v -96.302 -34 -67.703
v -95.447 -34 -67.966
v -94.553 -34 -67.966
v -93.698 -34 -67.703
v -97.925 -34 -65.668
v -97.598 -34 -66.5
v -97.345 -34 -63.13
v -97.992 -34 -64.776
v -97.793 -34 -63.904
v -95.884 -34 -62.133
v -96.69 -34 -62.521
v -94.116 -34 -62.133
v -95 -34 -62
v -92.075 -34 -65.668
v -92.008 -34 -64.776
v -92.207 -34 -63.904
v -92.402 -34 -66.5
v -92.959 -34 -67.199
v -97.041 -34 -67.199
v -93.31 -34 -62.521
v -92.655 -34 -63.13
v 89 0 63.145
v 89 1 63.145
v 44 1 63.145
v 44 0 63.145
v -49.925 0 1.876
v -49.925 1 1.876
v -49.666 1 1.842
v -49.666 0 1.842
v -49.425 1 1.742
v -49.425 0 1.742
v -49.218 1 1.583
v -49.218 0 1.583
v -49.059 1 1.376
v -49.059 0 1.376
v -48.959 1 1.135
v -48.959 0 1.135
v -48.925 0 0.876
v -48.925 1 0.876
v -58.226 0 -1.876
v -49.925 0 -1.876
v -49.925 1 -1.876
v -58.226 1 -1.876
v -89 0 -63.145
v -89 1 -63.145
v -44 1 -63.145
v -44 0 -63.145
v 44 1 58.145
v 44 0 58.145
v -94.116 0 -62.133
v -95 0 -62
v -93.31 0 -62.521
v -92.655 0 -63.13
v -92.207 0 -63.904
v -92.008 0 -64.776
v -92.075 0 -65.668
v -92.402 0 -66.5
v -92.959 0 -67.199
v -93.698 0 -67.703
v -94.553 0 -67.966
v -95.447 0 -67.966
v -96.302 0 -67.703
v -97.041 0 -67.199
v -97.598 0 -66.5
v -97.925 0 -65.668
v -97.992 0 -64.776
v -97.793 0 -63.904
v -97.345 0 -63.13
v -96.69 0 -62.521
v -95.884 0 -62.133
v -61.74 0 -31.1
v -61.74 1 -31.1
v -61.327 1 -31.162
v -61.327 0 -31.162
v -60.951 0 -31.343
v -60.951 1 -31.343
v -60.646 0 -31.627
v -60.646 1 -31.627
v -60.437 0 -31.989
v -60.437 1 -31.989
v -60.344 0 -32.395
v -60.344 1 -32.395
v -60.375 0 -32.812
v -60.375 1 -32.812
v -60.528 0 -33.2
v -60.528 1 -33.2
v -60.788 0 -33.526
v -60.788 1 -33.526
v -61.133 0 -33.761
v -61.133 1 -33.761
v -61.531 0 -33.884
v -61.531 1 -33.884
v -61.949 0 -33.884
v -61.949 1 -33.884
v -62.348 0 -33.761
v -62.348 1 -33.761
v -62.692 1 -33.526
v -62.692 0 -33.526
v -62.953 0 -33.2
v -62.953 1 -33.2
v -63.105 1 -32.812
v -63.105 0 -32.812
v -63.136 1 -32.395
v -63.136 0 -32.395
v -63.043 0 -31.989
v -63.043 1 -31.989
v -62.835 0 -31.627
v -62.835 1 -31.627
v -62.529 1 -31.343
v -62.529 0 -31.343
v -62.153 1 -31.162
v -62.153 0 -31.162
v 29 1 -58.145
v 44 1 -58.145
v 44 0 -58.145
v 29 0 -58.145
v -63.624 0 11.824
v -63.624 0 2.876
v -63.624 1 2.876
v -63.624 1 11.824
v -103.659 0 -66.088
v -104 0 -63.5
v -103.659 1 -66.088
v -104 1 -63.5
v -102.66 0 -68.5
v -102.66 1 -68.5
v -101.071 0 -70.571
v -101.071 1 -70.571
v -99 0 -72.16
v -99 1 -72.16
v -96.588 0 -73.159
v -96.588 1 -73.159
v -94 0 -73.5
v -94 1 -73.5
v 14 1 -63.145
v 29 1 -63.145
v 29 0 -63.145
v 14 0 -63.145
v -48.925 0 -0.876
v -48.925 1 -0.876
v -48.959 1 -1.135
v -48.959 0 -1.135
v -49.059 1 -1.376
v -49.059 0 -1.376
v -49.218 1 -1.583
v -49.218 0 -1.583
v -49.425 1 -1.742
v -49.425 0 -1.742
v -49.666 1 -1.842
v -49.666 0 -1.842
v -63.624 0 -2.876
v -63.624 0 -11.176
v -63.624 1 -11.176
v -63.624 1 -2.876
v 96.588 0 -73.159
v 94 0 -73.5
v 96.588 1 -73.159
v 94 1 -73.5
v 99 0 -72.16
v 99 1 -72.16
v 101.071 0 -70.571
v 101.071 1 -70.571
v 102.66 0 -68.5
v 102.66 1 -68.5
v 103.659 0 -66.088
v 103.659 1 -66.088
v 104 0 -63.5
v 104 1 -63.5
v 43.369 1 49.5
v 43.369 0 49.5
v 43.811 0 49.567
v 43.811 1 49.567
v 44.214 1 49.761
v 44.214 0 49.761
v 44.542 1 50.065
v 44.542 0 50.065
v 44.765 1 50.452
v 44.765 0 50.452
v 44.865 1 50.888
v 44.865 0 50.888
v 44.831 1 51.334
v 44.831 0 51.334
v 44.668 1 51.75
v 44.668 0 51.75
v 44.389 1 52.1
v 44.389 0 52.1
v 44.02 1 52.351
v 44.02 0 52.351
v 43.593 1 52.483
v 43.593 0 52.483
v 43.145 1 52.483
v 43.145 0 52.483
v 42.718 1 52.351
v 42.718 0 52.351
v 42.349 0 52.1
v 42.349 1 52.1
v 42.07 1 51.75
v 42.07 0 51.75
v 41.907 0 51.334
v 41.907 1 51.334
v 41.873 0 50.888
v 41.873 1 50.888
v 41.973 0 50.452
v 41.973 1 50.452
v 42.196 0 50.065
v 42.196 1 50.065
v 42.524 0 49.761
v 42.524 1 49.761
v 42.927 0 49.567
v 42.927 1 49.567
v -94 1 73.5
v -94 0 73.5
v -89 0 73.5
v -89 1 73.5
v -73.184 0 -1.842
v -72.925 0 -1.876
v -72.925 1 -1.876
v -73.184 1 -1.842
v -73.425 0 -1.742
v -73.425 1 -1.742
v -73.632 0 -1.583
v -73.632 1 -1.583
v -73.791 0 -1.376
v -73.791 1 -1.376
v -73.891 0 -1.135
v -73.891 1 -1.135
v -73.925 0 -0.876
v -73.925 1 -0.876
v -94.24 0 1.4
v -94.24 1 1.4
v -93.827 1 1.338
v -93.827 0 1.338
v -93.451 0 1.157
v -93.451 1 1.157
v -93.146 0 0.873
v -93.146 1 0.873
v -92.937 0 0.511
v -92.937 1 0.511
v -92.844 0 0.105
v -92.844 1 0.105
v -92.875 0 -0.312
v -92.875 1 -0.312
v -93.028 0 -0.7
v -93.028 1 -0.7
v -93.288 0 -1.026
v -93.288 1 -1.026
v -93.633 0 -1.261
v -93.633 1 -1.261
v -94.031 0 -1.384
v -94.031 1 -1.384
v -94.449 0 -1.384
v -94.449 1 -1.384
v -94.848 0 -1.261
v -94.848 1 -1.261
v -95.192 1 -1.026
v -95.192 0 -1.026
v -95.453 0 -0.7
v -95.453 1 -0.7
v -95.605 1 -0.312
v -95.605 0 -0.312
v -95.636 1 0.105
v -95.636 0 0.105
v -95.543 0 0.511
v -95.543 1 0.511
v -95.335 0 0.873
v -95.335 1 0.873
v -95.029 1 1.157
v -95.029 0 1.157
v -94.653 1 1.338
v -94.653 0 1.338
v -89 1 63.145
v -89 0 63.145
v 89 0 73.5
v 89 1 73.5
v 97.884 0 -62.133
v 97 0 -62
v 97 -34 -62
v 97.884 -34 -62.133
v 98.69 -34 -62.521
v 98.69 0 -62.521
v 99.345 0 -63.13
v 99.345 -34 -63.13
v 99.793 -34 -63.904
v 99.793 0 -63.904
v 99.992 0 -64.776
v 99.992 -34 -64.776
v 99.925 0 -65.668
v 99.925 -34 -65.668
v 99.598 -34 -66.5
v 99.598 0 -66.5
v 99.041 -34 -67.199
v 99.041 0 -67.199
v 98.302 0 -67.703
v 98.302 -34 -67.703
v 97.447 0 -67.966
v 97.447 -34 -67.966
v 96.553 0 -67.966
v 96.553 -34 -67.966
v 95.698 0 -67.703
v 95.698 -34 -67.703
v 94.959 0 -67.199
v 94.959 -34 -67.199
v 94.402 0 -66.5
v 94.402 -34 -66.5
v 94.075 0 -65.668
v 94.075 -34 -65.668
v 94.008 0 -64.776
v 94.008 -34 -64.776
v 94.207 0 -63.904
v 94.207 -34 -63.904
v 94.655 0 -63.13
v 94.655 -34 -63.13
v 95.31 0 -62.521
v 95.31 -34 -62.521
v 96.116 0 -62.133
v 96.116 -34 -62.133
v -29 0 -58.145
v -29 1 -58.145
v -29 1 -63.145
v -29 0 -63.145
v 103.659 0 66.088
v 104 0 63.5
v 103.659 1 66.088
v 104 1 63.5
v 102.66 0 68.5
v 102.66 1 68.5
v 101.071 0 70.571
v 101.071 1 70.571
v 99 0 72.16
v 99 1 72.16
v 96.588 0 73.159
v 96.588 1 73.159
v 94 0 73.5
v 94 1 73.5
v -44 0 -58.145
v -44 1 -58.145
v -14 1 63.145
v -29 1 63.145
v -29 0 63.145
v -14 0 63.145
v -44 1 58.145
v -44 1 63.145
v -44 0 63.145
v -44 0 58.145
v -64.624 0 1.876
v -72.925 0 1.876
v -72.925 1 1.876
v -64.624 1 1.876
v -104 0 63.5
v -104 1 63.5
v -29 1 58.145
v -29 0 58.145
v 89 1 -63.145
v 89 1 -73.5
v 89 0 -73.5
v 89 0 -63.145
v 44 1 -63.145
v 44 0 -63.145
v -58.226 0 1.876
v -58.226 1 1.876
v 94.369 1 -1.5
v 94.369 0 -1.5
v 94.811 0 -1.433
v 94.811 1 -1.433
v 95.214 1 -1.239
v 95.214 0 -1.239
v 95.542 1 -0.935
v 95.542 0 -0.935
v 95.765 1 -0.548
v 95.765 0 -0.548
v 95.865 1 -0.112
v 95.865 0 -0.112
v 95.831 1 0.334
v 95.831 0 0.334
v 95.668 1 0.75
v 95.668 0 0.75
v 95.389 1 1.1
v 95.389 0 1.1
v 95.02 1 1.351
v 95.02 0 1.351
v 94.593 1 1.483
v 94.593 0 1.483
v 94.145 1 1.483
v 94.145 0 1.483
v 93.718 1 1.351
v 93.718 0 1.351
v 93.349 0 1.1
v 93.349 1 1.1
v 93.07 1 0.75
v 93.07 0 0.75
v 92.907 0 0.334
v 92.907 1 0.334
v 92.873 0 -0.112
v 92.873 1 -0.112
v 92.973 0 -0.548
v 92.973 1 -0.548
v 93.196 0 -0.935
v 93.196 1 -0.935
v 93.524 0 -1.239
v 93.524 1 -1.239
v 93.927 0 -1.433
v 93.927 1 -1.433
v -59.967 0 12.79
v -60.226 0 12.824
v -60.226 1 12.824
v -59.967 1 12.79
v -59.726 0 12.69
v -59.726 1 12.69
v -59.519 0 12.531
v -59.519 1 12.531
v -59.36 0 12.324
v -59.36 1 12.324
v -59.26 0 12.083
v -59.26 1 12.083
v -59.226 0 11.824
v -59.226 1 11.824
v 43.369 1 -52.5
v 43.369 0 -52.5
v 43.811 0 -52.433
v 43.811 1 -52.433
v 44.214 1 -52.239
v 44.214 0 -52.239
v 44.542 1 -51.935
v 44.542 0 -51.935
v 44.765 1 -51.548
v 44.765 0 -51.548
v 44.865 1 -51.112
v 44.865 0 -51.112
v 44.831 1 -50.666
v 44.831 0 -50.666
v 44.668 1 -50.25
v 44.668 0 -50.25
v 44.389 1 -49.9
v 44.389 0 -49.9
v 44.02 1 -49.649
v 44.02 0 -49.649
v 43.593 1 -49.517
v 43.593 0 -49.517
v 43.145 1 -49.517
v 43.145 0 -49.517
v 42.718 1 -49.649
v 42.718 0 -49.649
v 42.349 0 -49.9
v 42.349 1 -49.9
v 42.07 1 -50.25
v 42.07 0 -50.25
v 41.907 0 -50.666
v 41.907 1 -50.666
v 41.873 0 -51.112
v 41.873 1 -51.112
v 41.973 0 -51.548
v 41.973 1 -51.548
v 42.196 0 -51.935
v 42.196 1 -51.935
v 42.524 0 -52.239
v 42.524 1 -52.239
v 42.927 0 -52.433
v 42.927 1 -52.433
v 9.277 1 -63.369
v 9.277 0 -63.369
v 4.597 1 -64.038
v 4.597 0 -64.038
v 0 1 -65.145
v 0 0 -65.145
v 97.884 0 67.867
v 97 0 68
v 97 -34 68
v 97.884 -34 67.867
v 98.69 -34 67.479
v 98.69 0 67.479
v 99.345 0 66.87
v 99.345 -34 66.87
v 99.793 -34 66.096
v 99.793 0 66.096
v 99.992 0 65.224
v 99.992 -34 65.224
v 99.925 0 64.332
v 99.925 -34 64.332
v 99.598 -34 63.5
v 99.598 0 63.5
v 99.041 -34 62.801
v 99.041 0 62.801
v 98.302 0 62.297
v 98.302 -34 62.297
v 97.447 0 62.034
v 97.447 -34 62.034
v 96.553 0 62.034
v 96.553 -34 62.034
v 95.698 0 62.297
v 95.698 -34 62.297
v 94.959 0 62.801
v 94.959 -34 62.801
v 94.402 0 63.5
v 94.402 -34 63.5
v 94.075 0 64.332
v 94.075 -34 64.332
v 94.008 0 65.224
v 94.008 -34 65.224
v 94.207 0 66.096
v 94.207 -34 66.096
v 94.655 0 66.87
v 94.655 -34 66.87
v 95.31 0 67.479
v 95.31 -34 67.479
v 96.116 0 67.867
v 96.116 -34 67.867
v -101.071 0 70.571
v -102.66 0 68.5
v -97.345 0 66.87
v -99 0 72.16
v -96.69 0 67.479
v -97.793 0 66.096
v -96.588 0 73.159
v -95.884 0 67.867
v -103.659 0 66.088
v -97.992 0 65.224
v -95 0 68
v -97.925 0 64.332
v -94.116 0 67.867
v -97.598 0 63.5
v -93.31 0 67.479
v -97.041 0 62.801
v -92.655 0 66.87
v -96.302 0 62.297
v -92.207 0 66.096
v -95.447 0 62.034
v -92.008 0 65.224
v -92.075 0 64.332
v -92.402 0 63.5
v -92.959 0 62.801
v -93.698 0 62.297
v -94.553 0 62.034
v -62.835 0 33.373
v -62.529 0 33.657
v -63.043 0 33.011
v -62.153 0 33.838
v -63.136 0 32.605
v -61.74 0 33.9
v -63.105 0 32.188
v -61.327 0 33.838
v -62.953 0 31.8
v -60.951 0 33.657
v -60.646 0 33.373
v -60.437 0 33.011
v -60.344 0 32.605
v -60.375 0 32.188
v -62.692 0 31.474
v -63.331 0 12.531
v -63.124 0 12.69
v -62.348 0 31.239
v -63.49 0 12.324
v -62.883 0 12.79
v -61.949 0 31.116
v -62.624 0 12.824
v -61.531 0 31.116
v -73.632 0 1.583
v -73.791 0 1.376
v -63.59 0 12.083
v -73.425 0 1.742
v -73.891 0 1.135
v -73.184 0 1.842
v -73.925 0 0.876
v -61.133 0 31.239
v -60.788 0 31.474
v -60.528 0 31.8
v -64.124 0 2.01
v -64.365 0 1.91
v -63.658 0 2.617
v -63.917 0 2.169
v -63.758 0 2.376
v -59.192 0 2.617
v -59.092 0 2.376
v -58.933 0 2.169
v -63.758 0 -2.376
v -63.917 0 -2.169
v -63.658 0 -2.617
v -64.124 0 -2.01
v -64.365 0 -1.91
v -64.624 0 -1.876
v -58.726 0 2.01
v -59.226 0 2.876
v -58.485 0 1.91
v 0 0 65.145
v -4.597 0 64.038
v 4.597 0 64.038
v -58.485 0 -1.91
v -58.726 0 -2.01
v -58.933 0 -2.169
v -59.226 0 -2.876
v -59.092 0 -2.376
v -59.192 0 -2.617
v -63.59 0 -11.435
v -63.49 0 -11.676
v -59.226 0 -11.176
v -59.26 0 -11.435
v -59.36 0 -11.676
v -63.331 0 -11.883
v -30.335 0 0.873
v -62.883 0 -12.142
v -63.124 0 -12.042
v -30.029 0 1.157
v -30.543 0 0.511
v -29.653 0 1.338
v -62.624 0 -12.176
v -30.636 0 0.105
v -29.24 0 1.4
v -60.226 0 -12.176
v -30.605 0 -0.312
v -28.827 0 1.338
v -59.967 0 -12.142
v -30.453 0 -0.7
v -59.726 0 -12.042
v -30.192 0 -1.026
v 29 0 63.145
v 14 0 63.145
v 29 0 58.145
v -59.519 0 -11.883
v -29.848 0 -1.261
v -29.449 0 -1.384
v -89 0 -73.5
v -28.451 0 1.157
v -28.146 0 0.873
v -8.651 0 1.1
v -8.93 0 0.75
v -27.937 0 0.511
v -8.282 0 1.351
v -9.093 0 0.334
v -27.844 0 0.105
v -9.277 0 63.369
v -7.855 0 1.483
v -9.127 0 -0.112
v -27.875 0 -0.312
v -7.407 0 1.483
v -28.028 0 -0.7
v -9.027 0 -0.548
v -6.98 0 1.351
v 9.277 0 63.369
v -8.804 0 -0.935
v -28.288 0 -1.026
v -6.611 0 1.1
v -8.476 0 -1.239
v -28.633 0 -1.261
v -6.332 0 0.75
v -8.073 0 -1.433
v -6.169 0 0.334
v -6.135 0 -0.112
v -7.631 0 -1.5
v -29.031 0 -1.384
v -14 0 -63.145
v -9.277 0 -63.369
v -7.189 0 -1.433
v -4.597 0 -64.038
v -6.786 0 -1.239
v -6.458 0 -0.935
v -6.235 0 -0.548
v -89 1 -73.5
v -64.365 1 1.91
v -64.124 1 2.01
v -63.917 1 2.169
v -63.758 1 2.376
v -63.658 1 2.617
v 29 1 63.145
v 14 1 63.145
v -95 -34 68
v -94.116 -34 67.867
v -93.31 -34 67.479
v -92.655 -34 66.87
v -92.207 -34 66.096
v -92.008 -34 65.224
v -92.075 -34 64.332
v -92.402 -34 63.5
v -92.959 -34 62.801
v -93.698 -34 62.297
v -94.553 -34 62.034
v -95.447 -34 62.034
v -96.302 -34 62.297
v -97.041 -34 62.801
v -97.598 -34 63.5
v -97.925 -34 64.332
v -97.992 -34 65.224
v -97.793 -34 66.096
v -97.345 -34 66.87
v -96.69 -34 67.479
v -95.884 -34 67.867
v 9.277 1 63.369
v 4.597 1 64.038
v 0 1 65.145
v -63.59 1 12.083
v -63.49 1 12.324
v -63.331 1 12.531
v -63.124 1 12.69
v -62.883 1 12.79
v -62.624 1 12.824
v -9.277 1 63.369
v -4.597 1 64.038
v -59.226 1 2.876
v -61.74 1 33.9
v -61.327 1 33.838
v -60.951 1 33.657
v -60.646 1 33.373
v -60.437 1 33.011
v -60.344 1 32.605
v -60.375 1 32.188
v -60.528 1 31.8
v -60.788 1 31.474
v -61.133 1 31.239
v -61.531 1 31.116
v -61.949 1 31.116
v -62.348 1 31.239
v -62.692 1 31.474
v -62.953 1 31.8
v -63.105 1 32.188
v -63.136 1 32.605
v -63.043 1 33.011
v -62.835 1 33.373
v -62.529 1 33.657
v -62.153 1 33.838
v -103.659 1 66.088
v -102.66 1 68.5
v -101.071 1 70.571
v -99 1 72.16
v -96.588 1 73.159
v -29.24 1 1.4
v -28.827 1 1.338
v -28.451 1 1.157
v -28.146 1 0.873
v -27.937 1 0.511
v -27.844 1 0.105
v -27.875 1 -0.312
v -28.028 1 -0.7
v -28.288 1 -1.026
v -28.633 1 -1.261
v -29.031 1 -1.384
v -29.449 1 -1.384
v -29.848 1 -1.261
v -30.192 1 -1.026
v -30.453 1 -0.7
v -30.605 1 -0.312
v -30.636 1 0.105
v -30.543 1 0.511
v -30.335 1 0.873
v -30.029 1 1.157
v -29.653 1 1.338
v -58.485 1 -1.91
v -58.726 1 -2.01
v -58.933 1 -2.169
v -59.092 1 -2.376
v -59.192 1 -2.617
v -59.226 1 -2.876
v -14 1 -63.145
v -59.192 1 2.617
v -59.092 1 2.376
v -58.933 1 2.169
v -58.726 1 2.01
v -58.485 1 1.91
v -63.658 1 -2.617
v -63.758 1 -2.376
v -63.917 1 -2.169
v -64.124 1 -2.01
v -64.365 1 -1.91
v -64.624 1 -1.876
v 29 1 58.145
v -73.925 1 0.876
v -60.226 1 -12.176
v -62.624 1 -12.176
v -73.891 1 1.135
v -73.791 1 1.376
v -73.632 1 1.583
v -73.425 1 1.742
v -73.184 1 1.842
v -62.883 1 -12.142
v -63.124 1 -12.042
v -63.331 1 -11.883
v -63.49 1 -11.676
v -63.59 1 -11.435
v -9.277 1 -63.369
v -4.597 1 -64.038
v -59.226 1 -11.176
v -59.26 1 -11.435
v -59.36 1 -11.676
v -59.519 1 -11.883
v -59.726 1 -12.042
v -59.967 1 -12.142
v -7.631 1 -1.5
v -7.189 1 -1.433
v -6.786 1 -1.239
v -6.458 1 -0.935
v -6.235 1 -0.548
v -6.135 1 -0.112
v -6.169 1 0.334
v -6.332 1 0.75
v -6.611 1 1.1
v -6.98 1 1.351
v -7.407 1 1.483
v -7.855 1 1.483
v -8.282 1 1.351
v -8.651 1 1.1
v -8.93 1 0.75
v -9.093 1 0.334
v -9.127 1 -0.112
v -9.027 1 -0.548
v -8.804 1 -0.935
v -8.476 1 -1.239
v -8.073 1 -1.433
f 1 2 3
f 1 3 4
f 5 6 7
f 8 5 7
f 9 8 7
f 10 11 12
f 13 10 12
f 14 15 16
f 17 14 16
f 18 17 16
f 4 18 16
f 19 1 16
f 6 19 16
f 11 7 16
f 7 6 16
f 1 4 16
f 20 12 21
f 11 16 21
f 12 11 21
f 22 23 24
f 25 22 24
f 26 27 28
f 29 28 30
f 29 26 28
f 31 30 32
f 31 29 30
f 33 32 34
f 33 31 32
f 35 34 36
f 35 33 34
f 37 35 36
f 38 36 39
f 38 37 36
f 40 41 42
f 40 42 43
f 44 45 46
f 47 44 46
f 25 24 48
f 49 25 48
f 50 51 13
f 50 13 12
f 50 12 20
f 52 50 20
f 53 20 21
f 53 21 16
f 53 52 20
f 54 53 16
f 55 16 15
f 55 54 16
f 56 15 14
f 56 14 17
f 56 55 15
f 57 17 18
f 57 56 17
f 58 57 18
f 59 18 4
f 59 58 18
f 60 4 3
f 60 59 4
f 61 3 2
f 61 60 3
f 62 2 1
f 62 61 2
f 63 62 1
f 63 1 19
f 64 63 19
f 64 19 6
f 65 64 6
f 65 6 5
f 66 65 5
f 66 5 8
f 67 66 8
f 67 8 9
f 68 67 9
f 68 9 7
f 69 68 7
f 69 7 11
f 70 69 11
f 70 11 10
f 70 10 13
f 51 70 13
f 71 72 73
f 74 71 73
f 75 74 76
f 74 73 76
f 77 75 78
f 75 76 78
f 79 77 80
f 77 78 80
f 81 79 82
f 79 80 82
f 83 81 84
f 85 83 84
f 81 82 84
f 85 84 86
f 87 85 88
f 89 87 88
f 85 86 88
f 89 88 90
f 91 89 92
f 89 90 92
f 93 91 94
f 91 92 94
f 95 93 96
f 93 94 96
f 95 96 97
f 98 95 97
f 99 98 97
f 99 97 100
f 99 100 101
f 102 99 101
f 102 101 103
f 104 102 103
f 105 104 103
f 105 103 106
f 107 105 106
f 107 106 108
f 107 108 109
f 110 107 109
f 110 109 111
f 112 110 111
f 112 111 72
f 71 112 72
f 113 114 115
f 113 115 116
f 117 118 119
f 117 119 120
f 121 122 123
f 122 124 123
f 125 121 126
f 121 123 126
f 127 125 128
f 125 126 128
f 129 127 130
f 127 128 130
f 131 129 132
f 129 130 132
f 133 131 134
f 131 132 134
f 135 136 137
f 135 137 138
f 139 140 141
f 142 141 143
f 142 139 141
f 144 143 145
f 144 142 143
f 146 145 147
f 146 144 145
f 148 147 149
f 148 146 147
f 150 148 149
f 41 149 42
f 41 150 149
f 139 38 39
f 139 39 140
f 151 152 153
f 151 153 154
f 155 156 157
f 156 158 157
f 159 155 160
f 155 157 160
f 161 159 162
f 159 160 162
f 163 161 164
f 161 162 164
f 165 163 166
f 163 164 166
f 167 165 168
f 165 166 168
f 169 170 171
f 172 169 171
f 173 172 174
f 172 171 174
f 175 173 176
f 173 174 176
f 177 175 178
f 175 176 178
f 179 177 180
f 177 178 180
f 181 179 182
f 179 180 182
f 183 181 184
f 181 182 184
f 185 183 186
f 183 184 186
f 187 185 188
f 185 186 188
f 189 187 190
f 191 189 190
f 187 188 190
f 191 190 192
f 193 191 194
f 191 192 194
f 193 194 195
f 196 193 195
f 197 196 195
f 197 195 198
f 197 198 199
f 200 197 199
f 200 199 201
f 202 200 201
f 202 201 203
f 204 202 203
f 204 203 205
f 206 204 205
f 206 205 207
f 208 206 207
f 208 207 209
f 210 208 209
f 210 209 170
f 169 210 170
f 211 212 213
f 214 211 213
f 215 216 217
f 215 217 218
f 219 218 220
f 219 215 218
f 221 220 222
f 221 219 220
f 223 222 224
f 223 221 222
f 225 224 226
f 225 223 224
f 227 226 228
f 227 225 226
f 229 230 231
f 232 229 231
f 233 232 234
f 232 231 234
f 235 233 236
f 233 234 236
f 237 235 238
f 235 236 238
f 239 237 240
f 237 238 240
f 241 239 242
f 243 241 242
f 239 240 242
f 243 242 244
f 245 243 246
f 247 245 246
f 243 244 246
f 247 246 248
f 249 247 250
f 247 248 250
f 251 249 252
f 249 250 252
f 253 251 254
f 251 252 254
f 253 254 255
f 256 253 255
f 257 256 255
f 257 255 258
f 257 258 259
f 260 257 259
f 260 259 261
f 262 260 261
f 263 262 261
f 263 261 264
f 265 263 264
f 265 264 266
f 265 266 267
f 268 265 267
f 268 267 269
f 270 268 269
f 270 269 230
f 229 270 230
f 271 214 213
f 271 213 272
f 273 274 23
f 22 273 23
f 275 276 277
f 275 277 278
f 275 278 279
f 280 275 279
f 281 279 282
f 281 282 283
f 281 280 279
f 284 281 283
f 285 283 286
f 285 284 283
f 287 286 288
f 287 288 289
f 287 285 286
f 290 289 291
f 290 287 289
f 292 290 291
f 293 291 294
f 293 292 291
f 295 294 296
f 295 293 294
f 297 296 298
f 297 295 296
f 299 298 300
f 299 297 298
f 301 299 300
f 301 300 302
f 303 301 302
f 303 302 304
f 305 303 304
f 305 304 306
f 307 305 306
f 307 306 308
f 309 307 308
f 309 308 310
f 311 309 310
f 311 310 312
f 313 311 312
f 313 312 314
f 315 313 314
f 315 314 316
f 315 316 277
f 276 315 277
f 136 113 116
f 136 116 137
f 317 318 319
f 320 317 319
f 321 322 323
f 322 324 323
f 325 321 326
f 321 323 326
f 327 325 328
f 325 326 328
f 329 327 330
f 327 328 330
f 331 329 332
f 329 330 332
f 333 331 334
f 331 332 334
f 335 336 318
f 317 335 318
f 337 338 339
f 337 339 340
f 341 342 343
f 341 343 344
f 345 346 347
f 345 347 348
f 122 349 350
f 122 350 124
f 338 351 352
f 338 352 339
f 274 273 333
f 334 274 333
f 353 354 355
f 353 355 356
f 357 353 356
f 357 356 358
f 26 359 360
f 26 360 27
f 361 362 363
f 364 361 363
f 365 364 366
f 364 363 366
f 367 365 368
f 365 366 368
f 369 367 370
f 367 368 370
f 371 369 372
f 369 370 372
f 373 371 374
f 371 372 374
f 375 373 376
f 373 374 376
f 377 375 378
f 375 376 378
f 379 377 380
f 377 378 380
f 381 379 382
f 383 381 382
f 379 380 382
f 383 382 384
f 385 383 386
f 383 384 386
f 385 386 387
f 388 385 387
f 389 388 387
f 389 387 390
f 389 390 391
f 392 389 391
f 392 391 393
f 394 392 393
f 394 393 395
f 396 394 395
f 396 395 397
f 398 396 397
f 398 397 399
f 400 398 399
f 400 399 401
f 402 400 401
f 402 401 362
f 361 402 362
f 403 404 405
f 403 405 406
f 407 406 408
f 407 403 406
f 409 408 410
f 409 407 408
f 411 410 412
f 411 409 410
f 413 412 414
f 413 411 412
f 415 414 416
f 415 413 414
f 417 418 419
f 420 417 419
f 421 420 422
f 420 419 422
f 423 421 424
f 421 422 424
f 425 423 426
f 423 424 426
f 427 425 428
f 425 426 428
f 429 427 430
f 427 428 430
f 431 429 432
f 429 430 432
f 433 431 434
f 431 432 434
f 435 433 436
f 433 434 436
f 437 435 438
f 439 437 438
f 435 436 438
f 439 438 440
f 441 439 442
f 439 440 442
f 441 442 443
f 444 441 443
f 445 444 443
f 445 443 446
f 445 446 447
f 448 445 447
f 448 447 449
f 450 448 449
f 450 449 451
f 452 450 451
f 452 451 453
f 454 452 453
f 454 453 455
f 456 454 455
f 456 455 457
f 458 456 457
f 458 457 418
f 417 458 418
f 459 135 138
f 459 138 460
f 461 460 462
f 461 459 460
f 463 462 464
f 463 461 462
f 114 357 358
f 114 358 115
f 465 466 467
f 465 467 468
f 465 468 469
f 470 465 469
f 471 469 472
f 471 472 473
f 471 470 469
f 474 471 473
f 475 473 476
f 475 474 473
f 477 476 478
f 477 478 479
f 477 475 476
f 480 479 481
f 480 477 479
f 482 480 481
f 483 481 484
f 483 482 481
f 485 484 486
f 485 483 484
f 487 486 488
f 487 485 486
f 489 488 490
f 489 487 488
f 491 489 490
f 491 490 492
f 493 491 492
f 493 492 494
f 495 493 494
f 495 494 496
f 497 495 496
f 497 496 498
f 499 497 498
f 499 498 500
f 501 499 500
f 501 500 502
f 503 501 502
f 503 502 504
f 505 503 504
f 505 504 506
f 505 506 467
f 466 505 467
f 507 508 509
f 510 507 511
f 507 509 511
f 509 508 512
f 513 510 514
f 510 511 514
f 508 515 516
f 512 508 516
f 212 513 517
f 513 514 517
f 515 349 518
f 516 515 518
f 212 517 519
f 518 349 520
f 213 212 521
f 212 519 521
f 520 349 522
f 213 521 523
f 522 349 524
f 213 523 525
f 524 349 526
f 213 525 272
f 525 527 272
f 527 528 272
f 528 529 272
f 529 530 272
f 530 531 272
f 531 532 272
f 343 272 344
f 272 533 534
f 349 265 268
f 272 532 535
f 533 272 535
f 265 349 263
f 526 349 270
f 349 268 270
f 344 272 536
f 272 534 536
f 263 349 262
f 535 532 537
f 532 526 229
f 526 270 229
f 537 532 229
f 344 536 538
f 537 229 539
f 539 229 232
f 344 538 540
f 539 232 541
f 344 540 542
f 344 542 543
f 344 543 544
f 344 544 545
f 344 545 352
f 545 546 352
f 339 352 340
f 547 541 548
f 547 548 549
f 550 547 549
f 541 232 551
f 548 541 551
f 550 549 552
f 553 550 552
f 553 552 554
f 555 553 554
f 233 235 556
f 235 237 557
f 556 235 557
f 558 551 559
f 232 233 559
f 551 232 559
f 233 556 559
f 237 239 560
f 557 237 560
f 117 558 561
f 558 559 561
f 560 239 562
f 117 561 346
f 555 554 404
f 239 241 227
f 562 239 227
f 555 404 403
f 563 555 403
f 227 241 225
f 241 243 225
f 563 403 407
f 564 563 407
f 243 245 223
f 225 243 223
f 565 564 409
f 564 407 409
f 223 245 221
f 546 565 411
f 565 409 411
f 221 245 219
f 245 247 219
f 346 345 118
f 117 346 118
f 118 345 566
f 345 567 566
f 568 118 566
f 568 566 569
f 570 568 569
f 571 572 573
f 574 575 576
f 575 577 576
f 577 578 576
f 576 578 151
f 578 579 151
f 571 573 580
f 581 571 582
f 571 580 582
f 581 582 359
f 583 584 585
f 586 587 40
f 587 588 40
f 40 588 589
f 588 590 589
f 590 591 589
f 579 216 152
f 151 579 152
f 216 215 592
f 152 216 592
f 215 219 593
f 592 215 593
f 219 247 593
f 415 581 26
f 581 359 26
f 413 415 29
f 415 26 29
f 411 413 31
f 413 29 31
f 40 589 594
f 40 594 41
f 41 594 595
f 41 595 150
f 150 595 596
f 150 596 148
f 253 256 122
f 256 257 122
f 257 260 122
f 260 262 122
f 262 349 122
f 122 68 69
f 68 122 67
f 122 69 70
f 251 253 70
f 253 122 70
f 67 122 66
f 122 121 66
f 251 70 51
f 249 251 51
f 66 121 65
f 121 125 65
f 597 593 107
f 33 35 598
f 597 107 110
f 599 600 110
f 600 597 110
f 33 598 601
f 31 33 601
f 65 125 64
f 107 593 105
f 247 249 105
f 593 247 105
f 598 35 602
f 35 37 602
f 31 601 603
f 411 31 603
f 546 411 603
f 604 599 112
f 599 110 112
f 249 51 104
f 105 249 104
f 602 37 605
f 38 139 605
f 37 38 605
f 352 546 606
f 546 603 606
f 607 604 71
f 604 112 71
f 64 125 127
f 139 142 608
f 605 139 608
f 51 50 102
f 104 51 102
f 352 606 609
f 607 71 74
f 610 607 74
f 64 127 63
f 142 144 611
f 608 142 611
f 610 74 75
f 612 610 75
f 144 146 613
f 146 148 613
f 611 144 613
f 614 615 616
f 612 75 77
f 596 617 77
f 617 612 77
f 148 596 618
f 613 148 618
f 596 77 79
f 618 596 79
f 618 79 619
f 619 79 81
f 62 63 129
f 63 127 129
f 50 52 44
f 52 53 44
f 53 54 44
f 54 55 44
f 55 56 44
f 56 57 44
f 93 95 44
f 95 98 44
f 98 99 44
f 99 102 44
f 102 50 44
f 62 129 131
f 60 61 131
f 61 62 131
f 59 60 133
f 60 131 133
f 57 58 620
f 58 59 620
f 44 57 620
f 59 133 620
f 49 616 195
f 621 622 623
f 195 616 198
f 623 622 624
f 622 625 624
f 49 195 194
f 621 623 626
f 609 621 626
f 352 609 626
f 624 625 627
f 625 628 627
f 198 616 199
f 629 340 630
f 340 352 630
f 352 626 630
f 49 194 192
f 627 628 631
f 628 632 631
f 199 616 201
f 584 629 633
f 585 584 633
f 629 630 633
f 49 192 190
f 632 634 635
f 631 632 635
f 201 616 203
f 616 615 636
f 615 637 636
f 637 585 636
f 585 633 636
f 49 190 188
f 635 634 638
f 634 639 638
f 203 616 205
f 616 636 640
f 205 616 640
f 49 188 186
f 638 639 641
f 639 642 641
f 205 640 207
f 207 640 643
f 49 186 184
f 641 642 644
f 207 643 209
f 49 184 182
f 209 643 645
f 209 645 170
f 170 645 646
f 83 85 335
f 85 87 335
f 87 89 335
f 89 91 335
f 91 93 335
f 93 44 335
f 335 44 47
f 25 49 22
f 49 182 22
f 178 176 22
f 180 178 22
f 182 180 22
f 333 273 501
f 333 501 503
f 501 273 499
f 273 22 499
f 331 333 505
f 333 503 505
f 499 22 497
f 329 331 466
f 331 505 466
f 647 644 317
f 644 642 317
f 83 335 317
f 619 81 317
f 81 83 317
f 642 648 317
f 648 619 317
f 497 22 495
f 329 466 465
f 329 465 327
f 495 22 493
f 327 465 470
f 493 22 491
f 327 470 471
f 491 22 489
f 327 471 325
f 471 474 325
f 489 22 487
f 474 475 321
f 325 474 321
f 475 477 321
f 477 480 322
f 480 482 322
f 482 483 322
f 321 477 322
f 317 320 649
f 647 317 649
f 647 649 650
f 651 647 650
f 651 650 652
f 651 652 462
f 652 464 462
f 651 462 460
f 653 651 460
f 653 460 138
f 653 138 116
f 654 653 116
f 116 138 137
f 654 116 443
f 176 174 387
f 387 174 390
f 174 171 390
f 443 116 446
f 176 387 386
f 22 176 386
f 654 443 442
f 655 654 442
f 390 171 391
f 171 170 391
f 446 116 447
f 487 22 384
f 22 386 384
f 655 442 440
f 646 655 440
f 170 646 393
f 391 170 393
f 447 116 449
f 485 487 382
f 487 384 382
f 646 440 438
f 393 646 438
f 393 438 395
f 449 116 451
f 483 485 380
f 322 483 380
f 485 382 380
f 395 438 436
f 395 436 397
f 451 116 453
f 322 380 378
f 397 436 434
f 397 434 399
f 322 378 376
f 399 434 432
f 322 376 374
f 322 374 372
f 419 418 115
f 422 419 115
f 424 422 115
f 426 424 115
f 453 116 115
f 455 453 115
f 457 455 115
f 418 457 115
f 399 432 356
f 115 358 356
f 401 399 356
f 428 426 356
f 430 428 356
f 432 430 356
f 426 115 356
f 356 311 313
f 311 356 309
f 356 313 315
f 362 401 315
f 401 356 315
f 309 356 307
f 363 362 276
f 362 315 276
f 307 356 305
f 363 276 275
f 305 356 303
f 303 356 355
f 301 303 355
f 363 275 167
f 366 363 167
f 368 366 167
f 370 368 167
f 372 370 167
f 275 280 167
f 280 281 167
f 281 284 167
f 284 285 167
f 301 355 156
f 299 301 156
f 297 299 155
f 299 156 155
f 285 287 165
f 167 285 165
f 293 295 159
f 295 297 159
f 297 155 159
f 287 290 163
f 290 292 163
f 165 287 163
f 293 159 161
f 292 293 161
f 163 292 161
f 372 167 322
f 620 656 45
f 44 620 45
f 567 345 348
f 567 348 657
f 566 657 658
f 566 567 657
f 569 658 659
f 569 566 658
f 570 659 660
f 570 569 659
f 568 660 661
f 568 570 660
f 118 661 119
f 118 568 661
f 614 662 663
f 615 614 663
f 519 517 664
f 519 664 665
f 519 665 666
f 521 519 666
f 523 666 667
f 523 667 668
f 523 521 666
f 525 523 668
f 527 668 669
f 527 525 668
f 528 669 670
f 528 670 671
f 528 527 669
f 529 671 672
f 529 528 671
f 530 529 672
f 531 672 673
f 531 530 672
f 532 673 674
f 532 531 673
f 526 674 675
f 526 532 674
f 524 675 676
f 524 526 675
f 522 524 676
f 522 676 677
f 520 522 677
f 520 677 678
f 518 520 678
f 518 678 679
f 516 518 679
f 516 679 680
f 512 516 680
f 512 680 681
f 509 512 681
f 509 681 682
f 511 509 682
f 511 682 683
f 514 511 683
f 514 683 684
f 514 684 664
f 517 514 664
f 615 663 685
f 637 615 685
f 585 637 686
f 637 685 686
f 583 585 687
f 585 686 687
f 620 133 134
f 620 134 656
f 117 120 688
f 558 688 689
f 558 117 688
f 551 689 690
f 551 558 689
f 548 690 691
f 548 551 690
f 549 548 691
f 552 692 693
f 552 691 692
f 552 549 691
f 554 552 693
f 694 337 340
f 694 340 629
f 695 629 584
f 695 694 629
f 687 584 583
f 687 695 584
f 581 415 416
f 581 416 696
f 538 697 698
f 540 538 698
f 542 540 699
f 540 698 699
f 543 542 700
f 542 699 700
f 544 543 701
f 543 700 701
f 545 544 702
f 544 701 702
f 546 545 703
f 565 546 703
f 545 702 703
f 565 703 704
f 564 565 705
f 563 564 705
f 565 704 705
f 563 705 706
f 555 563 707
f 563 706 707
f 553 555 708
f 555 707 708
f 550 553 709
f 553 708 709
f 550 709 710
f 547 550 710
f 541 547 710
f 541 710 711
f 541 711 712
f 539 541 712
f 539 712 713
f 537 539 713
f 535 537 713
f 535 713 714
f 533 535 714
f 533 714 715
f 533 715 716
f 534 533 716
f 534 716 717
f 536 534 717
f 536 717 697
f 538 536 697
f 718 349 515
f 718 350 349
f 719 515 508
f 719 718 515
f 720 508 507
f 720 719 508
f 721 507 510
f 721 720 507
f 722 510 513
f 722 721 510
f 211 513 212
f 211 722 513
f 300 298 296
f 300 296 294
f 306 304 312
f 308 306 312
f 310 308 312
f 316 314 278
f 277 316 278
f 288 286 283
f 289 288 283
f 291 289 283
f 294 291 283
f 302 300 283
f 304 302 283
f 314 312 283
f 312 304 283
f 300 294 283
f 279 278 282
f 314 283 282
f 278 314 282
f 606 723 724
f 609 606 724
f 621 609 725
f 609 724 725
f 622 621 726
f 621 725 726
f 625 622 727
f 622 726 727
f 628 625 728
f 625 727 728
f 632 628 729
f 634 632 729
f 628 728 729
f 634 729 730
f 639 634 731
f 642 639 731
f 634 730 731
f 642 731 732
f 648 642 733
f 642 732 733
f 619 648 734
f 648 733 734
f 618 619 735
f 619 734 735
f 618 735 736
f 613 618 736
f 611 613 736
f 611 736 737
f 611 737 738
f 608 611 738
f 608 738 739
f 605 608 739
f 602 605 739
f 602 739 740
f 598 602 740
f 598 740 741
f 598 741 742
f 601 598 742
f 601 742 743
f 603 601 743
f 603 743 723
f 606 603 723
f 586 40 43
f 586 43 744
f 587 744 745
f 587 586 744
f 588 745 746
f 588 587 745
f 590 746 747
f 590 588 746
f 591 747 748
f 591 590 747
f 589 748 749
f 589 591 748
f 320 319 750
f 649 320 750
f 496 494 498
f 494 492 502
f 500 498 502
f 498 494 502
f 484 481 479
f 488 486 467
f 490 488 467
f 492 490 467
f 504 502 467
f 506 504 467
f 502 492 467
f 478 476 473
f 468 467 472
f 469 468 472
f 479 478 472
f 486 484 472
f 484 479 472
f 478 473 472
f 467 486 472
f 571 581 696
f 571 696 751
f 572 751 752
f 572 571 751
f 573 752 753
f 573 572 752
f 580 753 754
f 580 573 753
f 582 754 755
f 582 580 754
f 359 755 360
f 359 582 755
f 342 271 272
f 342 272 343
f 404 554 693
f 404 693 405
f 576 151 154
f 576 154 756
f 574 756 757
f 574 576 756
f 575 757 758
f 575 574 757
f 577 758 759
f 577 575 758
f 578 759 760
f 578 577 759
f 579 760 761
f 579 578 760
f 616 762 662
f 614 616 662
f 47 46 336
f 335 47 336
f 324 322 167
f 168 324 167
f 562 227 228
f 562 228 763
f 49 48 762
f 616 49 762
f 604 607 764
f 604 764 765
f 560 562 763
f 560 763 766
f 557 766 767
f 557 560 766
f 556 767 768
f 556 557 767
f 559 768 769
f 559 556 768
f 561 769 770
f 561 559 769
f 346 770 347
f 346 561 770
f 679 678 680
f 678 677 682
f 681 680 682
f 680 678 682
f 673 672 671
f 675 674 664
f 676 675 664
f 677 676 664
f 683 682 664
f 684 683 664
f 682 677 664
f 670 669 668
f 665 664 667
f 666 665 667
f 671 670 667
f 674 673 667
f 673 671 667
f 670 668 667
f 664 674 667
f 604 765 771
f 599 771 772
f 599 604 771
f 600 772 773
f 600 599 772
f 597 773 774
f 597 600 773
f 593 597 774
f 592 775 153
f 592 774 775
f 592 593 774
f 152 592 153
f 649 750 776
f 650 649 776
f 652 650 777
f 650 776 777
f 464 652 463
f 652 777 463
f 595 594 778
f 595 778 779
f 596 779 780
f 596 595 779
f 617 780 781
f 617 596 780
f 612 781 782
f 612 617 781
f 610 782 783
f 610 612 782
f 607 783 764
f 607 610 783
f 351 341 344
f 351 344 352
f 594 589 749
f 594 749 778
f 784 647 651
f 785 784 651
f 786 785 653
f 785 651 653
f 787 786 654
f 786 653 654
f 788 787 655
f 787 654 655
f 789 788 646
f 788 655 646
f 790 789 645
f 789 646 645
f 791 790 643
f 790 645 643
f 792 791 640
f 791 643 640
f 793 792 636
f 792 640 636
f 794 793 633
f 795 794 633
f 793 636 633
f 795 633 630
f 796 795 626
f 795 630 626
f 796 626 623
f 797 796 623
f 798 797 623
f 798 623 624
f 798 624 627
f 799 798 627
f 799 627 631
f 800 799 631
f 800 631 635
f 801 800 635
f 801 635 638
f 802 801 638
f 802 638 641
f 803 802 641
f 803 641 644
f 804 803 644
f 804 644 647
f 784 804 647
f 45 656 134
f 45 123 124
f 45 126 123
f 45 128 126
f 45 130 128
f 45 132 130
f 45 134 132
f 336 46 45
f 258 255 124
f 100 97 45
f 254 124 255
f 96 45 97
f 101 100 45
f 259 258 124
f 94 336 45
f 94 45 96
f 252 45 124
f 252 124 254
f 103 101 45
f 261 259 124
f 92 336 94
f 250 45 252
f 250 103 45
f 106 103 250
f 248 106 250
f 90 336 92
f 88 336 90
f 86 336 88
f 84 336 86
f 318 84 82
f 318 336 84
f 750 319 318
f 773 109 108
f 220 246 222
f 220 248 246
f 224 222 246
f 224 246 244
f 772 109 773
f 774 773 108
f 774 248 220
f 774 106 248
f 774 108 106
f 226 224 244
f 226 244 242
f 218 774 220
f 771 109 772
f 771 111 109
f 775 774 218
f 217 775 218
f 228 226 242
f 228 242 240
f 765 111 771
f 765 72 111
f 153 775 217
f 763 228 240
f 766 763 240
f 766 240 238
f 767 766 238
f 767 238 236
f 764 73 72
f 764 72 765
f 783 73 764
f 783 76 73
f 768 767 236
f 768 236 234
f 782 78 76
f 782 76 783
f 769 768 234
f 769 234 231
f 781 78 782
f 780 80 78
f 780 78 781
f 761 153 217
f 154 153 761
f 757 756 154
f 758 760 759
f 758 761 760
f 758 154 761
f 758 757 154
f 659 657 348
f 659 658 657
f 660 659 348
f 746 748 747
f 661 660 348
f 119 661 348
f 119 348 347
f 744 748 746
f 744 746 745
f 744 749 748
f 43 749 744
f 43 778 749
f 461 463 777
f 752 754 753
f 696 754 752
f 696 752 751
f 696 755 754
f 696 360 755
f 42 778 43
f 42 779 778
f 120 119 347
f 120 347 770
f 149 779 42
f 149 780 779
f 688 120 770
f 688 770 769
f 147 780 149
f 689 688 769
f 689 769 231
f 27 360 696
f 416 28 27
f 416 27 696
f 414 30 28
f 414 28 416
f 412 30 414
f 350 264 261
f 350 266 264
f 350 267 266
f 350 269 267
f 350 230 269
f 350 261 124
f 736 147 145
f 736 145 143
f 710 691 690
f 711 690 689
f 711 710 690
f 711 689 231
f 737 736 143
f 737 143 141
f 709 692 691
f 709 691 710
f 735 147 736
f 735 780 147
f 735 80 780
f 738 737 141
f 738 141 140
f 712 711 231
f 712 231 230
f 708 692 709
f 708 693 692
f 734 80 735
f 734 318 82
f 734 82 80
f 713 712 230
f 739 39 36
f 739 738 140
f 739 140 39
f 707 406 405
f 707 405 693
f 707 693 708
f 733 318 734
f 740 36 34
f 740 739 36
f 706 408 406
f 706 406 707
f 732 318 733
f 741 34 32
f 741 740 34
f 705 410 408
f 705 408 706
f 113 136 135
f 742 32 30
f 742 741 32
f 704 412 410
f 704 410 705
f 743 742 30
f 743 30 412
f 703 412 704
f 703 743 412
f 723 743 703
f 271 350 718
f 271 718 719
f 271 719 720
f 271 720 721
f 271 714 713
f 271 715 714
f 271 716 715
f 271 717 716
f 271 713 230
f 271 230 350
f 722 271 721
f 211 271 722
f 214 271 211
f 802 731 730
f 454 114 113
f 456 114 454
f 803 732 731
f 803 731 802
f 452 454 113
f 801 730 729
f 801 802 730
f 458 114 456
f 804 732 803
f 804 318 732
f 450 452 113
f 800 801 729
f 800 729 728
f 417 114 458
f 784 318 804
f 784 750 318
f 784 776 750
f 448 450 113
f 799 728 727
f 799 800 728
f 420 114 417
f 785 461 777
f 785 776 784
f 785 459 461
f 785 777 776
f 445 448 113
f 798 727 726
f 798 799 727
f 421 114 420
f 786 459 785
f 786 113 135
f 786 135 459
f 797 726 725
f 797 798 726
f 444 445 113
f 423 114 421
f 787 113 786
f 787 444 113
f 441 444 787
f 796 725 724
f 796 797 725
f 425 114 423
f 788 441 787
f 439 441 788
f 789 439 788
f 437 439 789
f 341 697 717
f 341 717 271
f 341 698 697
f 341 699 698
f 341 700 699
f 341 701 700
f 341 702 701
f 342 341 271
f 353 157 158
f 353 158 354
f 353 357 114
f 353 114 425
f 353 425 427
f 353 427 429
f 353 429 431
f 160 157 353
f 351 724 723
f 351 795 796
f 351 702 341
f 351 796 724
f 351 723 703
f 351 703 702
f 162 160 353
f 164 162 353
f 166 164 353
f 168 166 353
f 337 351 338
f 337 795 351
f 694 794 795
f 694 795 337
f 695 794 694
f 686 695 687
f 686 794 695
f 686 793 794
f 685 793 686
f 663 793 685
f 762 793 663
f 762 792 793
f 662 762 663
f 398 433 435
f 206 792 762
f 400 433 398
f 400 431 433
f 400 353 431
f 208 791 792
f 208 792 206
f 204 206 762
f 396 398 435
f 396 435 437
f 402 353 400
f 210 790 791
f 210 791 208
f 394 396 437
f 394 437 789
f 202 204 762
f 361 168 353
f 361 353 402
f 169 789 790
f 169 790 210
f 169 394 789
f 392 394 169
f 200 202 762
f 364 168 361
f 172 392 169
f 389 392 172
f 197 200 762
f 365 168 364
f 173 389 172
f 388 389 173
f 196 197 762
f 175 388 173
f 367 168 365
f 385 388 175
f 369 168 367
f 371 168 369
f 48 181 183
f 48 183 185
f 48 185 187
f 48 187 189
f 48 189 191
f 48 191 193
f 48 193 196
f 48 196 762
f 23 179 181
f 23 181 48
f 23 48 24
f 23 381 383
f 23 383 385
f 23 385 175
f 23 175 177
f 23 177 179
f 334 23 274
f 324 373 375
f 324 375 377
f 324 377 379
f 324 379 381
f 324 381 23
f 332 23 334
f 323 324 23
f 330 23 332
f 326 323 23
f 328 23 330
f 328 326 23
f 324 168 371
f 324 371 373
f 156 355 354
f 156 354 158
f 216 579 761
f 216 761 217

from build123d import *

# Parameters (mm, degrees)
SKETCH1_W            = 208
SKETCH1_H            = 147
BOSS_EXTRUDE1_DEPTH  = 1
CUT_EXTRUDE1_DEPTH   = 128.354819304
MIRROR2_COPY_1_DEPTH = 128.354819304
FILLET1_R            = 10
CUT_EXTRUDE2_DEPTH   = 128.354819304
SKETCH7_R            = 1.5
CUT_EXTRUDE3_DEPTH   = 128.354819304
SKETCH8_R            = 3
BOSS_EXTRUDE3_DEPTH  = 35
SKETCH9_R            = 1.4
CUT_EXTRUDE4_DEPTH   = 60


with BuildPart() as part:
    # Sketch1 → Boss-Extrude1 (new body)
    with BuildSketch(Plane(origin=(0, 0, 0), x_dir=(1, 0, 0), z_dir=(0, 1, 0))):
        Rectangle(SKETCH1_W, SKETCH1_H)
    extrude(amount=BOSS_EXTRUDE1_DEPTH)

    # Sketch3 → Cut-Extrude1 (cut, through all)
    with BuildSketch(Plane(origin=(0, 1, 0), x_dir=(1, 0, 0), z_dir=(0, 1, 0))):
        with BuildLine():
            Line((-89, 83.145473262), (-89, 63.145473262))
            Line((-89, 63.145473262), (-44, 63.145473262))
            Line((-44, 63.145473262), (-44, 58.145473262))
            Line((-44, 58.145473262), (-29, 58.145473262))
            Line((-29, 58.145473262), (-29, 63.145473262))
            Line((-29, 63.145473262), (-14, 63.145473262))
            ThreePointArc((-14, 63.145473262), (-6.928932188, 63.647998579), (0, 65.145473262))
            Line((0, 65.145473262), (0, 85.145473262))
            Line((0, 85.145473262), (-89, 85.145473262))
            Line((-89, 85.145473262), (-89, 83.145473262))
        make_face()
    cut_extrude1 = extrude(amount=-CUT_EXTRUDE1_DEPTH, mode=Mode.SUBTRACT)

    # Mirror1: Cut-Extrude1 across plane
    add(cut_extrude1.mirror(Plane.XY), mode=Mode.SUBTRACT)

    # Mirror2: Cut-Extrude1 across plane
    add(cut_extrude1.mirror(Plane(origin=(0, 0, 0), x_dir=(0, 0, 1), z_dir=(1, 0, 0))), mode=Mode.SUBTRACT)

    # Mirror2 copy 1 sketch → Mirror2 copy 1 (cut, through all)
    with BuildSketch(Plane(origin=(0, 1, 0), x_dir=(-1, 0, 0), z_dir=(0, 1, 0))):
        with BuildLine():
            Line((-89, 83.145473262), (-89, 63.145473262))
            Line((-89, 63.145473262), (-44, 63.145473262))
            Line((-44, 63.145473262), (-44, 58.145473262))
            Line((-44, 58.145473262), (-29, 58.145473262))
            Line((-29, 58.145473262), (-29, 63.145473262))
            Line((-29, 63.145473262), (-14, 63.145473262))
            ThreePointArc((-14, 63.145473262), (-6.928932188, 63.647998579), (0, 65.145473262))
            Line((0, 65.145473262), (0, 85.145473262))
            Line((0, 85.145473262), (-89, 85.145473262))
            Line((-89, 85.145473262), (-89, 83.145473262))
        make_face()
    extrude(amount=-MIRROR2_COPY_1_DEPTH, mode=Mode.SUBTRACT)

    # Fillet1
    fillet1_edges = [part.edges().sort_by_distance(p)[0] for p in [
        (104, 0.5, 73.5),
        (-104, 0.5, 73.5),
        (-104, 0.5, -73.5),
        (104, 0.5, -73.5),
    ]]
    fillet(fillet1_edges, radius=FILLET1_R)

    # Sketch4 → Cut-Extrude2 (cut, through all)
    with BuildSketch(Plane.XZ):
        with BuildLine():
            Line((-58.225796132, 1.876244538), (-49.924870206, 1.876244538))
            ThreePointArc((-49.924870206, 1.876244538), (-49.217763425, 1.583351319), (-48.924870206, 0.876244538))
            Line((-48.924870206, 0.876244538), (-48.924870206, -0.876244538))
            ThreePointArc((-48.924870206, -0.876244538), (-49.217763425, -1.583351319), (-49.924870206, -1.876244538))
            Line((-49.924870206, -1.876244538), (-58.225796132, -1.876244538))
            ThreePointArc((-58.225796132, -1.876244538), (-58.932902913, -2.169137757), (-59.225796132, -2.876244538))
            Line((-59.225796132, -2.876244538), (-59.225796132, -11.176244538))
            ThreePointArc((-59.225796132, -11.176244538), (-59.518689351, -11.883351319), (-60.225796132, -12.176244538))
            Line((-60.225796132, -12.176244538), (-62.62394428, -12.176244538))
            ThreePointArc((-62.62394428, -12.176244538), (-63.331051061, -11.883351319), (-63.62394428, -11.176244538))
            Line((-63.62394428, -11.176244538), (-63.62394428, -2.876244538))
            ThreePointArc((-63.62394428, -2.876244538), (-63.916837499, -2.169137757), (-64.62394428, -1.876244538))
            Line((-64.62394428, -1.876244538), (-72.924870206, -1.876244538))
            ThreePointArc((-72.924870206, -1.876244538), (-73.631976987, -1.583351319), (-73.924870206, -0.876244538))
            Line((-73.924870206, -0.876244538), (-73.924870206, 0.876244538))
            ThreePointArc((-73.924870206, 0.876244538), (-73.631976987, 1.583351319), (-72.924870206, 1.876244538))
            Line((-72.924870206, 1.876244538), (-64.62394428, 1.876244538))
            ThreePointArc((-64.62394428, 1.876244538), (-63.916837499, 2.169137757), (-63.62394428, 2.876244538))
            Line((-63.62394428, 2.876244538), (-63.62394428, 11.823755462))
            ThreePointArc((-63.62394428, 11.823755462), (-63.331051061, 12.530862243), (-62.62394428, 12.823755462))
            Line((-62.62394428, 12.823755462), (-60.225796132, 12.823755462))
            ThreePointArc((-60.225796132, 12.823755462), (-59.518689351, 12.530862243), (-59.225796132, 11.823755462))
            Line((-59.225796132, 11.823755462), (-59.225796132, 2.876244538))
            ThreePointArc((-59.225796132, 2.876244538), (-58.932902913, 2.169137757), (-58.225796132, 1.876244538))
        make_face()
    extrude(amount=-CUT_EXTRUDE2_DEPTH, mode=Mode.SUBTRACT)

    # Sketch7 → Cut-Extrude3 (cut, through all)
    with BuildSketch(Plane.XZ):
        with Locations(Location((43.368968207, 51, 0), (0, 0, 270))):
            Circle(SKETCH7_R)
        with Locations(Location((-7.631031793, 0, 0), (0, 0, 270))):
            Circle(SKETCH7_R)
        with Locations(Location((94.368968207, 0, 0), (0, 0, 270))):
            Circle(SKETCH7_R)
        with Locations(Location((43.368968207, -51, 0), (0, 0, 270))):
            Circle(SKETCH7_R)
    extrude(amount=-CUT_EXTRUDE3_DEPTH, mode=Mode.SUBTRACT)

    # Sketch8 → Boss-Extrude3 (add)
    with BuildSketch(Plane(origin=(0, 1, 0), x_dir=(1, 0, 0), z_dir=(0, 1, 0))):
        with Locations(Location((-95, 65, 0), (0, 0, 270))):
            Circle(SKETCH8_R)
        with Locations(Location((-95, -65, 0), (0, 0, 270))):
            Circle(SKETCH8_R)
        with Locations(Location((97, -65, 0), (0, 0, 270))):
            Circle(SKETCH8_R)
        with Locations(Location((97, 65, 0), (0, 0, 270))):
            Circle(SKETCH8_R)
    extrude(amount=-BOSS_EXTRUDE3_DEPTH)

    # Sketch9 → Cut-Extrude4 (cut)
    with BuildSketch(Plane(origin=(0, 1, 0), x_dir=(1, 0, 0), z_dir=(0, 1, 0))):
        with Locations(Location((-61.740102401, 32.5, 0), (0, 0, 270))):
            Circle(SKETCH9_R)
        with Locations(Location((-94.240102401, 0, 0), (0, 0, 270))):
            Circle(SKETCH9_R)
        with Locations(Location((-61.740102401, -32.5, 0), (0, 0, 270))):
            Circle(SKETCH9_R)
        with Locations(Location((-29.240102401, 0, 0), (0, 0, 270))):
            Circle(SKETCH9_R)
    extrude(amount=-CUT_EXTRUDE4_DEPTH, mode=Mode.SUBTRACT)


solid = part.part
